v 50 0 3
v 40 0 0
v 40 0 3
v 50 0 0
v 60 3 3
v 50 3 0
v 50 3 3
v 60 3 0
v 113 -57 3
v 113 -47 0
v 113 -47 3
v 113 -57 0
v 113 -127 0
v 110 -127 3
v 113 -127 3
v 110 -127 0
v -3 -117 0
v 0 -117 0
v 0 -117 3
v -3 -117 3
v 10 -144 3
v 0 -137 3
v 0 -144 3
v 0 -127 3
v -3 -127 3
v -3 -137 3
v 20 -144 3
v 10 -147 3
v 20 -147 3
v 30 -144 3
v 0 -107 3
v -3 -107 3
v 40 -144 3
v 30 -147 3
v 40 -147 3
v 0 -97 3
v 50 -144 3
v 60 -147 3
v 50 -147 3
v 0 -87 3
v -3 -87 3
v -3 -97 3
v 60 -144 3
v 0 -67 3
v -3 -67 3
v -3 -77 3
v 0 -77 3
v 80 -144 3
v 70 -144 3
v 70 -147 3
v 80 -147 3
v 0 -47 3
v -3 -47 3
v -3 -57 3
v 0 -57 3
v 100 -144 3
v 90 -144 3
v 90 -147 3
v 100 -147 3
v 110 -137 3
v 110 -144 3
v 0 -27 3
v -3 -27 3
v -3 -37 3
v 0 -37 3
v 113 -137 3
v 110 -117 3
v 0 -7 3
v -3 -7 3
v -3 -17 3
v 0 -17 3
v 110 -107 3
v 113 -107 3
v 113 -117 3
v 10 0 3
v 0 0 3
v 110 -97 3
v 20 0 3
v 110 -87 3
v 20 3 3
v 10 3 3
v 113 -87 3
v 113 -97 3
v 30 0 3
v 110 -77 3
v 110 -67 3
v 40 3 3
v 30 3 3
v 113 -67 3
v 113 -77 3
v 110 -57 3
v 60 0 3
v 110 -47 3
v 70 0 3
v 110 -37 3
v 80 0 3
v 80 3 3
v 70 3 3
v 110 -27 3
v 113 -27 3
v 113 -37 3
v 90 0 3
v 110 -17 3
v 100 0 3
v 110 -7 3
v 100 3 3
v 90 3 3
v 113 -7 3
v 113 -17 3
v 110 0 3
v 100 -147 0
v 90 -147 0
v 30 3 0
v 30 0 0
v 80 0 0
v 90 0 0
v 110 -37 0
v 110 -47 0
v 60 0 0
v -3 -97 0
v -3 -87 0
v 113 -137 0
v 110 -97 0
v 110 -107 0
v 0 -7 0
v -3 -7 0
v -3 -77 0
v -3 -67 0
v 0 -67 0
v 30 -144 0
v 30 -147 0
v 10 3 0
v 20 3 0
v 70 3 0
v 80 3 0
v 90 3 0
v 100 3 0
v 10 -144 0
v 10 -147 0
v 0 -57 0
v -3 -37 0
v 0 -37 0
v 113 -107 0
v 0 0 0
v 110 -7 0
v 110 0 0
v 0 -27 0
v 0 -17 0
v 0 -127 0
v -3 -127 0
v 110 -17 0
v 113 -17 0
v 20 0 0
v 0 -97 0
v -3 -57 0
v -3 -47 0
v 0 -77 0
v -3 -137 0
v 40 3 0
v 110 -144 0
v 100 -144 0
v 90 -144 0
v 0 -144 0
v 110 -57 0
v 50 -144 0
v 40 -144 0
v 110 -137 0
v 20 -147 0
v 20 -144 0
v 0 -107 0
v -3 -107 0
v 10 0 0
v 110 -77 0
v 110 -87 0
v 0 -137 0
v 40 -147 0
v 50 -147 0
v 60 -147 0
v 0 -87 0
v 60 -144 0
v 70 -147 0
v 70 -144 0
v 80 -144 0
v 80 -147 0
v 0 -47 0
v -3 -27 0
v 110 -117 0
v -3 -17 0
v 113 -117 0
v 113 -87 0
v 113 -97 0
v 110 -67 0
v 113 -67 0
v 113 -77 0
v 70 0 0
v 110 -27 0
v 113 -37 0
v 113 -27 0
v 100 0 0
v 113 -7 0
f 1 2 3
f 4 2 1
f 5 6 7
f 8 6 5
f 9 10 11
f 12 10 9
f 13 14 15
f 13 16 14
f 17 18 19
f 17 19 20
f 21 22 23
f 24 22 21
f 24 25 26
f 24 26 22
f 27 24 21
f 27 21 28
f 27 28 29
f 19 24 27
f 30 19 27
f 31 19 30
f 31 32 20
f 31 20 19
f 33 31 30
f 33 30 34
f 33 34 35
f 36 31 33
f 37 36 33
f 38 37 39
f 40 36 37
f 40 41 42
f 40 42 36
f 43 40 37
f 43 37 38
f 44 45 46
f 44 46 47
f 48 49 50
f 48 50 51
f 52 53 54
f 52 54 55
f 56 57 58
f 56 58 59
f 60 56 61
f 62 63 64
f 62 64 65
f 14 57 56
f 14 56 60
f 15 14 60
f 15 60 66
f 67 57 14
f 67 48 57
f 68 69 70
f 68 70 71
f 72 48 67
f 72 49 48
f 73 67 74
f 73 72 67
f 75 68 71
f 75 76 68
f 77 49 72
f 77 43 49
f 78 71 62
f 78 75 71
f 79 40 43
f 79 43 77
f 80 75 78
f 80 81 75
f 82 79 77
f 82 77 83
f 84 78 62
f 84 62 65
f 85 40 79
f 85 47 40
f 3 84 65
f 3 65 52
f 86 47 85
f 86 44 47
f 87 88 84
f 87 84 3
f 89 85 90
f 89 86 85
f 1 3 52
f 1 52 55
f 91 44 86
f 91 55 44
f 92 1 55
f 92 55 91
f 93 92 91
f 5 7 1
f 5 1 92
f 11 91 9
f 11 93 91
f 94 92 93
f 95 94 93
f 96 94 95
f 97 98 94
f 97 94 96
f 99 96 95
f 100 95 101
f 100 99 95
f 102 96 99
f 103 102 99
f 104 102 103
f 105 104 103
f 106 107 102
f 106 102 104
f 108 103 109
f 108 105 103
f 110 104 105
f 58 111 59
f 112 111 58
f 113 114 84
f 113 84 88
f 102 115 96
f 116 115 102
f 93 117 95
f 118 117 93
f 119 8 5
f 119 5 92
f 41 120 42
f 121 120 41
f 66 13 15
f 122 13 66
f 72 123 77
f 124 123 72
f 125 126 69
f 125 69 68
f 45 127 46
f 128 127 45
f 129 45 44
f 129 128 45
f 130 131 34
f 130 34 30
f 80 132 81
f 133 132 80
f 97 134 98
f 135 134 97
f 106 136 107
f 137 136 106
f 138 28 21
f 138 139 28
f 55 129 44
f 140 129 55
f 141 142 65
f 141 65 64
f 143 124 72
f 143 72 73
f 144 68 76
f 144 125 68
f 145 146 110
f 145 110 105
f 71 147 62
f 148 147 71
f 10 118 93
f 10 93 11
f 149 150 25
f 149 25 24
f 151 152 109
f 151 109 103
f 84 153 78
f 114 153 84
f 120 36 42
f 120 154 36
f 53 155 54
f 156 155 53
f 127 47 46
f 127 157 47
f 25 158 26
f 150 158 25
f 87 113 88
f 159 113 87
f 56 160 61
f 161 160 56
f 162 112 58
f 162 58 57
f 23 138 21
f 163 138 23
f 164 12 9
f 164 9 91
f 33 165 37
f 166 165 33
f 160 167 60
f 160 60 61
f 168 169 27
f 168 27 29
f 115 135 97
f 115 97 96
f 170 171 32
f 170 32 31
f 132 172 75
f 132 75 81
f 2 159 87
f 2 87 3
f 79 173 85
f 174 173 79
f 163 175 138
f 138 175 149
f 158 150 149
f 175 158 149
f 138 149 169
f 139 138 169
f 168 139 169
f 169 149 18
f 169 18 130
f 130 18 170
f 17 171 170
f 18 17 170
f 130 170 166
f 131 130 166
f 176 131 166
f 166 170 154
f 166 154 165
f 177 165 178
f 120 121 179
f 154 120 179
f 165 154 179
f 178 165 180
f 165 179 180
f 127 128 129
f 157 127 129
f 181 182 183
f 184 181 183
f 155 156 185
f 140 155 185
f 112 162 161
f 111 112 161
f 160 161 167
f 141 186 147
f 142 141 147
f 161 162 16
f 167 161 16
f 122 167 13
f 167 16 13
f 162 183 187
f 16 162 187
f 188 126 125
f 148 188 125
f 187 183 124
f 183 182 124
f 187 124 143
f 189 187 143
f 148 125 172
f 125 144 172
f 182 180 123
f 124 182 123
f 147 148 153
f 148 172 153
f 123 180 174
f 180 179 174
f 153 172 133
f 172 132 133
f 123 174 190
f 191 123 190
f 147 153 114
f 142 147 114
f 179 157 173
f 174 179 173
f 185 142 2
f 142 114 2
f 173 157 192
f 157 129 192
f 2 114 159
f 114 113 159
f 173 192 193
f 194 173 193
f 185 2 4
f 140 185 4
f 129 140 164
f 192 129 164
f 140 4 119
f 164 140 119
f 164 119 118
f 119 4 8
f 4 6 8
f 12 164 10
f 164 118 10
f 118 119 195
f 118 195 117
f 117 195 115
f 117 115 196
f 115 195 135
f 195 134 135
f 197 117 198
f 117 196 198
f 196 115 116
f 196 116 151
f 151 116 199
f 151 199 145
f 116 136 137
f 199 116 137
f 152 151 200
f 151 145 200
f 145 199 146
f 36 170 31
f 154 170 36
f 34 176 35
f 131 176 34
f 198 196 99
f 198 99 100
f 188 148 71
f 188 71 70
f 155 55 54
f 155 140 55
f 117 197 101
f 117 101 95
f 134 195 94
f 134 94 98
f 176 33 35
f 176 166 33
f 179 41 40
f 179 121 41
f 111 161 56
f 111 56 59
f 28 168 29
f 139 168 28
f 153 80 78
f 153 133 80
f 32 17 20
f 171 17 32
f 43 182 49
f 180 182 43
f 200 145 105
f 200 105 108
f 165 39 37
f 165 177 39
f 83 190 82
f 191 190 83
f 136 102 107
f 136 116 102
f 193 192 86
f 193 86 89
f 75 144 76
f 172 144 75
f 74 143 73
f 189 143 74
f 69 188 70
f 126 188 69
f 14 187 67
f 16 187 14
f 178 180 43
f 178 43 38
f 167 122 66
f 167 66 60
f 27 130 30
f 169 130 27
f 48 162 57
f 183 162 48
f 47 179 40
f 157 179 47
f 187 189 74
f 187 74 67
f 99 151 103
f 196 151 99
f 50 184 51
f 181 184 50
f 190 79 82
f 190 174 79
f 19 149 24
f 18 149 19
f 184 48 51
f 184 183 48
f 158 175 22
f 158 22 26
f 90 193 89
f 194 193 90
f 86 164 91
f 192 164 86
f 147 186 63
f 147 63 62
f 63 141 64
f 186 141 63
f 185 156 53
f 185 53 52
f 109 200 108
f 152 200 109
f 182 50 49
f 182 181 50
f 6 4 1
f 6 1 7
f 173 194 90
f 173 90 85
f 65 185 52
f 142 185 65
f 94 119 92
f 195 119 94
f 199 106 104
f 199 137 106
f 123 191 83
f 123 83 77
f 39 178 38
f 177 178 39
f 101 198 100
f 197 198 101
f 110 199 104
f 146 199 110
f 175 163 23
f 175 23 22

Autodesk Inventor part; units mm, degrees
ref_plane "YZ Plane" through (0, 0, 0) normal (1, 0, 0) x (0, 1, 0)
ref_plane "XZ Plane" through (0, 0, 0) normal (0, 1, 0) x (-1, 0, 0)
ref_plane "XY Plane" through (0, 0, 0) normal (0, 0, 1) x (1, 0, 0)
sketch "Sketch1" plane through (0, 0, 0) normal (0, 0, 1) x (1, 0, 0)
  line L0 (311.0517, -16.9965) -> (311.0486, -14.2996) construction
  line L1 (311.0486, -14.2996) -> (302.0591, -14.3097) construction
  line L2 (302.0591, -14.3097) -> (302.0622, -17.0066) construction
  line L3 (302.0622, -17.0066) -> (293.0727, -17.0167) construction
  line L4 (293.0727, -17.0167) -> (293.0696, -14.3199) construction
  line L5 (293.0696, -14.3199) -> (284.0801, -14.33) construction
  line L6 (284.0801, -14.33) -> (284.0832, -17.0268) construction
  line L7 (284.0832, -17.0268) -> (275.0937, -17.0369) construction
  line L8 (275.0937, -17.0369) -> (275.0906, -14.3401) construction
  line L9 (275.0906, -14.3401) -> (266.1012, -14.3502) construction
  line L10 (266.1012, -14.3502) -> (266.1042, -17.047) construction
  line L11 (266.1042, -17.047) -> (257.1147, -17.0571) construction
  line L12 (257.1147, -17.0571) -> (257.1117, -14.3603) construction
  line L13 (257.1117, -14.3603) -> (248.1222, -14.3704) construction
  line L14 (248.1222, -14.3704) -> (248.1252, -17.0672) construction
  line L15 (248.1252, -17.0672) -> (239.1357, -17.0773) construction
  line L16 (239.1357, -17.0773) -> (239.1327, -14.3805) construction
  line L17 (239.1327, -14.3805) -> (230.1432, -14.3906) construction
  line L18 (230.1432, -14.3906) -> (230.1462, -17.0874) construction
  line L19 (320.0411, -23.2891) -> (322.738, -23.2891) construction
  line L20 (322.738, -23.2891) -> (322.738, -32.986) construction
  line L21 (322.738, -32.986) -> (320.0411, -32.986) construction
  line L22 (320.0411, -32.986) -> (320.0411, -41.9755) construction
  line L23 (320.0411, -41.9755) -> (322.738, -41.9755) construction
  line L24 (322.738, -41.9755) -> (322.738, -50.965) construction
  line L25 (322.738, -50.965) -> (320.0411, -50.965) construction
  line L26 (320.0411, -50.965) -> (320.0411, -59.9545) construction
  line L27 (320.0411, -59.9545) -> (322.738, -59.9545) construction
  line L28 (322.738, -59.9545) -> (322.738, -68.944) construction
  line L29 (322.738, -68.944) -> (320.0411, -68.944) construction
  line L30 (320.0411, -68.944) -> (320.0411, -77.9335) construction
  line L31 (320.0411, -77.9335) -> (322.738, -77.9335) construction
  line L32 (322.738, -77.9335) -> (322.738, -86.9229) construction
  line L33 (322.738, -86.9229) -> (320.0411, -86.9229) construction
  line L34 (320.0411, -86.9229) -> (320.0411, -95.9124) construction
  line L35 (320.0411, -95.9124) -> (322.738, -95.9124) construction
  line L36 (322.738, -95.9124) -> (322.738, -104.9019) construction
  line L37 (322.738, -104.9019) -> (320.0411, -104.9019) construction
  line L38 (322.738, -113.8914) -> (323.0503, -123.1532) construction
  line L39 (323.0503, -123.1532) -> (328.4284, -122.9718) construction
  line L40 (328.4284, -122.9718) -> (328.4284, -131.9613) construction
  line L41 (328.4284, -131.9613) -> (331.1252, -131.9613) construction
  line L42 (331.1252, -131.9613) -> (331.1252, -140.9508) construction
  line L43 (331.1252, -140.9508) -> (328.4284, -140.9508) construction
  line L44 (328.4284, -140.9508) -> (328.4284, -147.2435) construction
  line L45 (318.4284, -147.2435) -> (318.4284, -149.9403) construction
  line L46 (318.4284, -149.9403) -> (308.4284, -149.9403) construction
  line L47 (308.4284, -149.9403) -> (308.4284, -147.2435) construction
  line L48 (308.4284, -147.2435) -> (298.4284, -147.2435) construction
  line L49 (298.4284, -147.2435) -> (298.4284, -149.9403) construction
  line L50 (298.4284, -149.9403) -> (288.4284, -149.9403) construction
  line L51 (288.4284, -149.9403) -> (288.4284, -147.2435) construction
  line L52 (288.4284, -147.2435) -> (278.4284, -147.2435) construction
  line L53 (278.4284, -147.2435) -> (278.4284, -149.9403) construction
  line L54 (278.4284, -149.9403) -> (268.4284, -149.9403) construction
  line L55 (268.4284, -149.9403) -> (268.4284, -147.2435) construction
  line L56 (268.4284, -147.2435) -> (258.4284, -147.2435) construction
  line L57 (258.4284, -147.2435) -> (258.4284, -149.9403) construction
  line L58 (258.4284, -149.9403) -> (248.4284, -149.9403) construction
  line L59 (248.4284, -149.9403) -> (248.4284, -147.2435) construction
  line L60 (248.4284, -147.2435) -> (239.4389, -147.2435) construction
  line L61 (239.4389, -147.2435) -> (239.4389, -149.9403) construction
  line L62 (239.4389, -149.9403) -> (230.4494, -149.9403) construction
  line L63 (230.4494, -149.9403) -> (230.4494, -147.2435) construction
  line L64 (218.4599, -140.9508) -> (218.4599, -131.9613) construction
  line L65 (218.4599, -131.9613) -> (221.1567, -131.9613) construction
  line L66 (221.1567, -131.9613) -> (221.1567, -122.9718) construction
  line L67 (221.1567, -122.9718) -> (218.4599, -122.9718) construction
  line L68 (218.4599, -122.9718) -> (218.4599, -113.9823) construction
  line L69 (218.4599, -113.9823) -> (221.1567, -113.9823) construction
  line L70 (221.1567, -113.9823) -> (221.1567, -104.9929) construction
  line L71 (221.1567, -104.9929) -> (218.4599, -104.9929) construction
  line L72 (218.4599, -104.9929) -> (218.4599, -96.0034) construction
  line L73 (218.4599, -96.0034) -> (221.1567, -96.0034) construction
  line L74 (221.1567, -96.0034) -> (221.1567, -87.0139) construction
  line L75 (221.1567, -87.0139) -> (218.4599, -87.0139) construction
  line L76 (218.4599, -87.0139) -> (218.4599, -78.0244) construction
  line L77 (218.4599, -78.0244) -> (221.1567, -78.0244) construction
  line L78 (221.1567, -78.0244) -> (221.1567, -69.0349) construction
  line L79 (221.1567, -69.0349) -> (218.4599, -69.0349) construction
  line L80 (218.4599, -69.0349) -> (218.4599, -60.0454) construction
  line L81 (218.4599, -60.0454) -> (221.1567, -60.0454) construction
  line L82 (221.1567, -60.0454) -> (221.1567, -51.0559) construction
  line L83 (221.1567, -51.0559) -> (218.4599, -51.0559) construction
  line L84 (218.4599, -51.0559) -> (218.4599, -42.0664) construction
  line L85 (218.4599, -42.0664) -> (221.1567, -42.0664) construction
  line L86 (221.1567, -42.0664) -> (221.1567, -33.0769) construction
  line L87 (221.1567, -33.0769) -> (218.4599, -33.0769) construction
  line L88 (218.4599, -33.0769) -> (218.4599, -24.0874) construction
  line L89 (218.4599, -24.0874) -> (221.1567, -24.0874) construction
  line L90 (221.1567, -24.0874) -> (221.1567, -17.0874) construction
  line L91 (320.0411, -104.9019) -> (320.0411, -113.8914) construction
  line L92 (320.0411, -113.8914) -> (322.738, -113.8914) construction
  line L93 (318.4284, -147.2435) -> (328.4284, -147.2435) construction
  line L94 (221.1567, -17.0874) -> (230.1462, -17.0874) construction
  line L95 (221.4599, -147.2435) -> (230.4494, -147.2435) construction
  line L96 (311.0517, -16.9965) -> (320.0411, -16.9965) construction
  line L97 (320.0411, -16.9965) -> (320.0411, -23.2891) construction
  line L98 (221.4599, -147.2435) -> (221.4599, -140.9508) construction
  line L99 (218.4599, -140.9508) -> (221.4599, -140.9508) construction
  line L100 (0, 0) -> (10, 0)
  line L101 (10, 0) -> (10, 3)
  line L102 (10, 3) -> (20, 3)
  line L103 (20, 3) -> (20, 0)
  line L104 (20, 0) -> (30, 0)
  line L105 (30, 0) -> (30, 3)
  line L106 (30, 3) -> (40, 3)
  line L107 (40, 3) -> (40, 0)
  line L108 (40, 0) -> (50, 0)
  line L109 (50, 0) -> (50, 3)
  line L110 (50, 3) -> (60, 3)
  line L111 (60, 3) -> (60, 0)
  line L112 (60, 0) -> (70, 0)
  line L113 (70, 0) -> (70, 3)
  line L114 (70, 3) -> (80, 3)
  line L115 (80, 3) -> (80, 0)
  line L116 (80, 0) -> (90, 0)
  line L117 (90, 0) -> (90, 3)
  line L118 (90, 3) -> (100, 3)
  line L119 (100, 3) -> (100, 0)
  line L120 (100, 0) -> (110, 0)
  line L121 (110, 0) -> (110, -7)
  line L122 (110, -7) -> (113, -7)
  line L123 (113, -7) -> (113, -17)
  line L124 (113, -17) -> (110, -17)
  line L125 (110, -17) -> (110, -27)
  line L126 (110, -27) -> (113, -27)
  line L127 (113, -27) -> (113, -37)
  line L128 (113, -37) -> (110, -37)
  line L129 (110, -37) -> (110, -47)
  line L130 (110, -47) -> (113, -47)
  line L131 (113, -47) -> (113, -57)
  line L132 (113, -57) -> (110, -57)
  line L133 (110, -57) -> (110, -67)
  line L134 (110, -67) -> (113, -67)
  line L135 (113, -67) -> (113, -77)
  line L136 (113, -77) -> (110, -77)
  line L137 (110, -77) -> (110, -87)
  line L138 (110, -87) -> (113, -87)
  line L139 (113, -87) -> (113, -97)
  line L140 (113, -97) -> (110, -97)
  line L141 (110, -97) -> (110, -107)
  line L142 (110, -107) -> (113, -107)
  line L143 (113, -107) -> (113, -117)
  line L144 (113, -117) -> (110, -117)
  line L145 (110, -117) -> (110, -127)
  line L146 (110, -127) -> (113, -127)
  line L147 (113, -127) -> (113, -137)
  line L148 (113, -137) -> (110, -137)
  line L149 (110, -137) -> (110, -144)
  line L150 (110, -144) -> (100, -144)
  line L151 (100, -144) -> (100, -147)
  line L152 (100, -147) -> (90, -147)
  line L153 (90, -147) -> (90, -144)
  line L154 (90, -144) -> (80, -144)
  line L155 (80, -144) -> (80, -147)
  line L156 (80, -147) -> (70, -147)
  line L157 (70, -147) -> (70, -144)
  line L158 (70, -144) -> (60, -144)
  line L159 (60, -144) -> (60, -147)
  line L160 (60, -147) -> (50, -147)
  line L161 (50, -147) -> (50, -144)
  line L162 (50, -144) -> (40, -144)
  line L163 (40, -144) -> (40, -147)
  line L164 (40, -147) -> (30, -147)
  line L165 (30, -147) -> (30, -144)
  line L166 (30, -144) -> (20, -144)
  line L167 (20, -144) -> (20, -147)
  line L168 (20, -147) -> (10, -147)
  line L169 (10, -147) -> (10, -144)
  line L170 (10, -144) -> (0, -144)
  line L171 (0, -144) -> (0, -137)
  line L172 (0, -137) -> (-3, -137)
  line L173 (-3, -137) -> (-3, -127)
  line L174 (-3, -127) -> (0, -127)
  line L175 (0, -127) -> (0, -117)
  line L176 (0, -117) -> (-3, -117)
  line L177 (-3, -117) -> (-3, -107)
  line L178 (-3, -107) -> (0, -107)
  line L179 (0, -107) -> (0, -97)
  line L180 (0, -97) -> (-3, -97)
  line L181 (-3, -97) -> (-3, -87)
  line L182 (-3, -87) -> (0, -87)
  line L183 (0, -87) -> (0, -77)
  line L184 (0, -77) -> (-3, -77)
  line L185 (-3, -77) -> (-3, -67)
  line L186 (-3, -67) -> (0, -67)
  line L187 (0, -67) -> (0, -57)
  line L188 (0, -57) -> (-3, -57)
  line L189 (-3, -57) -> (-3, -47)
  line L190 (-3, -47) -> (0, -47)
  line L191 (0, -47) -> (0, -37)
  line L192 (0, -37) -> (-3, -37)
  line L193 (-3, -37) -> (-3, -27)
  line L194 (-3, -27) -> (0, -27)
  line L195 (0, -27) -> (0, -17)
  line L196 (0, -17) -> (-3, -17)
  line L197 (-3, -17) -> (-3, -7)
  line L198 (-3, -7) -> (0, -7)
  line L199 (0, -7) -> (0, 0)
  dimension "d263" = 8.9895
  dimension "d264" = 7
  dimension "d265" = 10
  dimension "d266" = 3
  dimension "d267" = 10
  dimension "d268" = 10
  dimension "d269" = 10
  dimension "d270" = 10
  dimension "d271" = 10
  dimension "d272" = 10
  dimension "d273" = 10
  dimension "d274" = 10
  dimension "d275" = 10
  dimension "d276" = 10
  dimension "d277" = 7
  dimension "d278" = 3
  dimension "d279" = 10
  dimension "d280" = 10
  dimension "d281" = 10
  dimension "d282" = 10
  dimension "d283" = 10
  dimension "d284" = 10
  dimension "d285" = 10
  dimension "d286" = 10
  dimension "d287" = 10
  dimension "d288" = 10
  dimension "d289" = 10
  dimension "d290" = 10
  dimension "d291" = 10
  dimension "d292" = 7
  dimension "d293" = 3
  dimension "d294" = 3
  dimension "d295" = 110
  dimension "d296" = 144
  dimension "d297" = 3
  dimension "d298" = 3
  dimension "d299" = 3
  dimension "d300" = 3
  dimension "d301" = 3
extrude "Extrusion1" add sketch "Sketch1" along normal blind 3
properties part number "cara_posterior"
